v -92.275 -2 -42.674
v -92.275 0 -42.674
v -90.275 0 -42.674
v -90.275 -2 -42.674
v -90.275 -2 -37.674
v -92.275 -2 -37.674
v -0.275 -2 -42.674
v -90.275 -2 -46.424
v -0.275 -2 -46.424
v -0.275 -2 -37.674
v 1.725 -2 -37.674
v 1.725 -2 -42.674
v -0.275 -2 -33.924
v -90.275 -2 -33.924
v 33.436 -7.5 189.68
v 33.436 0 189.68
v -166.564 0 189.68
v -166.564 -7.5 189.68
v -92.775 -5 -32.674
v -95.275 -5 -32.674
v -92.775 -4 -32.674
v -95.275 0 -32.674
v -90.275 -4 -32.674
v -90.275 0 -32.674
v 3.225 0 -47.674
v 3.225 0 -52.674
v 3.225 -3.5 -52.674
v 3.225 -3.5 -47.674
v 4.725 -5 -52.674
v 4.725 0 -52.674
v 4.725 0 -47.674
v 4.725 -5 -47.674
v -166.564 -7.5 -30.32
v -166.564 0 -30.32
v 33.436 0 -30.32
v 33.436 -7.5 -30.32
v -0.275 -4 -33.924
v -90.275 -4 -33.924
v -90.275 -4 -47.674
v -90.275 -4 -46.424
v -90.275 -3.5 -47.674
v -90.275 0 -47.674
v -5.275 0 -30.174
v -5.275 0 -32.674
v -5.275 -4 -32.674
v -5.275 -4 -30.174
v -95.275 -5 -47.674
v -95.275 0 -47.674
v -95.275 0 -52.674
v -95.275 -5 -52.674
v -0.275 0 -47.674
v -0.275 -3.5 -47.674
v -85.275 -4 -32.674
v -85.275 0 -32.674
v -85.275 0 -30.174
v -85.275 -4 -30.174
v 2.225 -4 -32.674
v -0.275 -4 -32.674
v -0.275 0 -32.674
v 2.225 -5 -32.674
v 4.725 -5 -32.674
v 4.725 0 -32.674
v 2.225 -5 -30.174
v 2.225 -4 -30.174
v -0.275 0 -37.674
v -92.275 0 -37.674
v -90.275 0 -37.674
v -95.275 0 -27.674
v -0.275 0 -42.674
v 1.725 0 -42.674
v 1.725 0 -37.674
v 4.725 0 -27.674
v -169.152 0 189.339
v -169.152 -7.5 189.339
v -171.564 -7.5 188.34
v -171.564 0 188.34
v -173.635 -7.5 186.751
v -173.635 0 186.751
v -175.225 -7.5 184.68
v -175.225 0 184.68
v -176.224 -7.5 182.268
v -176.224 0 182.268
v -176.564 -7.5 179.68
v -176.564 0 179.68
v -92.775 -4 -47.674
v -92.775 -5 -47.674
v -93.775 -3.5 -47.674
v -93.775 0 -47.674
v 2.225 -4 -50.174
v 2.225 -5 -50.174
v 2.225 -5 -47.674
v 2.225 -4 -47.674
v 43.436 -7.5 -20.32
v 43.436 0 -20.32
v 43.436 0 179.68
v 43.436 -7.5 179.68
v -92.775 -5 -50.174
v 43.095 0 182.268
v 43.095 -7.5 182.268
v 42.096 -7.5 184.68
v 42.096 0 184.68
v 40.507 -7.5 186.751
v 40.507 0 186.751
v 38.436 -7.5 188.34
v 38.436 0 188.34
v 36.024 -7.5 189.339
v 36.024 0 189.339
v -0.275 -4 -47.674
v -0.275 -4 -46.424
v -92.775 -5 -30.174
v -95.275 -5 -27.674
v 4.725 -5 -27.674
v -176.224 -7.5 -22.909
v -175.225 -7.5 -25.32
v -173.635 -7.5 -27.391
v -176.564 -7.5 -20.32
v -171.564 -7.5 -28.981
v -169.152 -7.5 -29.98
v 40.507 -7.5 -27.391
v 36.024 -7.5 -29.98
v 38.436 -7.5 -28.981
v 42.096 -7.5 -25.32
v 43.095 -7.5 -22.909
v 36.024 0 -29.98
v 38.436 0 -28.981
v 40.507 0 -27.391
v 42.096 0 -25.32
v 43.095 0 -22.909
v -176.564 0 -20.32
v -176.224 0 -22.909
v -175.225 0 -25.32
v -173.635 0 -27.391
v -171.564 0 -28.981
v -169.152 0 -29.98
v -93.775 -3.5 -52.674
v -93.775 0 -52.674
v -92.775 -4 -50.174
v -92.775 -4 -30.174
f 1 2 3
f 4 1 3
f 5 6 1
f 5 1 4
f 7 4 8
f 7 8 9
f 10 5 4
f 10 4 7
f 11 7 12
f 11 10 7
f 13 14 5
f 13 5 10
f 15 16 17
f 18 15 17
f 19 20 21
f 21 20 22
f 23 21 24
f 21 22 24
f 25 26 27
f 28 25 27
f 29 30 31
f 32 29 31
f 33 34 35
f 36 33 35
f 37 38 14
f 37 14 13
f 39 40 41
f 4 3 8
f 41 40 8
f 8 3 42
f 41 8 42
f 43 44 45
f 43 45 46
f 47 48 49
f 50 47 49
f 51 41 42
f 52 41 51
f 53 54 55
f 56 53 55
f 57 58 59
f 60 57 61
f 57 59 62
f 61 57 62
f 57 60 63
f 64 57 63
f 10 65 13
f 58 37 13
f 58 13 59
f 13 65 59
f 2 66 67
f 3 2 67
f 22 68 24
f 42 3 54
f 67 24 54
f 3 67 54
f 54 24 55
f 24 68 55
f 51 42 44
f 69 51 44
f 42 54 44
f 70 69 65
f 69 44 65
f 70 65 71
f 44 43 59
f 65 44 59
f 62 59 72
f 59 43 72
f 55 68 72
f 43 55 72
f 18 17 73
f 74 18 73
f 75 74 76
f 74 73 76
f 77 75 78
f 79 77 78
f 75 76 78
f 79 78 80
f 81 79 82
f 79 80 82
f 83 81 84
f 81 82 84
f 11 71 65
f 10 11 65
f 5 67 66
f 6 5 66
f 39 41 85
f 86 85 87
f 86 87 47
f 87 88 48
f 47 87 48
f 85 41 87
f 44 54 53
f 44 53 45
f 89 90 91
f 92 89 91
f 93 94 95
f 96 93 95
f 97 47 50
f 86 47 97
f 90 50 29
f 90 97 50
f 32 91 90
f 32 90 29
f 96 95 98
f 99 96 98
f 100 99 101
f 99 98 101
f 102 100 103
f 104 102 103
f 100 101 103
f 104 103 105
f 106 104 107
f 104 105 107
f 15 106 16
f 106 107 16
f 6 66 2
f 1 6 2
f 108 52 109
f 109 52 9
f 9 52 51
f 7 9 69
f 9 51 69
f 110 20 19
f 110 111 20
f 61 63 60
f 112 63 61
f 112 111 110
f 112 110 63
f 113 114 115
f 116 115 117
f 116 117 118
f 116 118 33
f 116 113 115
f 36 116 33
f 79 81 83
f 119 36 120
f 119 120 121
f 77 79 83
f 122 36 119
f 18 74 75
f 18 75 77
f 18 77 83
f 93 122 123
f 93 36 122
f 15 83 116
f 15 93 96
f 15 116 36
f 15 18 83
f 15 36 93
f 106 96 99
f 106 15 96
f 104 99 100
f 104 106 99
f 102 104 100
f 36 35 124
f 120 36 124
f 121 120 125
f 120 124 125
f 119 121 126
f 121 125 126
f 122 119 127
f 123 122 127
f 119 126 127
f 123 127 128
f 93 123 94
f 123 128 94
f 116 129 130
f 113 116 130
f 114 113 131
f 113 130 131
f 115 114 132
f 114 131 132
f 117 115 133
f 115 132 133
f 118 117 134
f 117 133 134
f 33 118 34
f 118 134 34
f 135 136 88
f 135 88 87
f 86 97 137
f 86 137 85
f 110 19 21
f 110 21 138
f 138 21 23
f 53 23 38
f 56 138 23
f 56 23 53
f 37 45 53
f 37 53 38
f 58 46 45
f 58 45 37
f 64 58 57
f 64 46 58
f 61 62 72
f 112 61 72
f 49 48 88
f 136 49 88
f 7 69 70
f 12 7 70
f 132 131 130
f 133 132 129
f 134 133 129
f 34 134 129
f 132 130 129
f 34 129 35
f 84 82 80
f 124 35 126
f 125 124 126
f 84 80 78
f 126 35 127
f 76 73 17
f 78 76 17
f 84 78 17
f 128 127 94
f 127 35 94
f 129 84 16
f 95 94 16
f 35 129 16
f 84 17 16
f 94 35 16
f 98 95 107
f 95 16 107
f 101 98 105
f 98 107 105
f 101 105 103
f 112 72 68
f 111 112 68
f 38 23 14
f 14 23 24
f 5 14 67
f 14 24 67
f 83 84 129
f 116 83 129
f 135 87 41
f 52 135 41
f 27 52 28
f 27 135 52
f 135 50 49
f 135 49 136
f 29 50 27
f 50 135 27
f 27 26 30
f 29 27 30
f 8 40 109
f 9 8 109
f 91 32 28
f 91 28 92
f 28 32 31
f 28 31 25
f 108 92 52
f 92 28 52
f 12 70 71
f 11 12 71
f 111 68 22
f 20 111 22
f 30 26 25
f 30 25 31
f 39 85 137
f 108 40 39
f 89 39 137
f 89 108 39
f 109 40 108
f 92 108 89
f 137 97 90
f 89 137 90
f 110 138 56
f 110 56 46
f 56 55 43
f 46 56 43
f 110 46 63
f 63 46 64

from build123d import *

# Parameters (mm, degrees)
F0_R     = 5
F1_DEPTH = 7.5
F2_W     = 80
F2_H     = 2.5
F3_DEPTH = 5
F4_W     = 94
F4_H     = 12.5
F5_DEPTH = 3
F6_W     = 97
F6_H     = 3.5
F7_DEPTH = 5
F8_W     = 95
F8_H     = 20
F9_DEPTH = 1


with BuildPart() as f1:
    # F0 (on Front) → F1 (new body)
    with BuildSketch(Plane.XZ):
        with BuildLine():
            Line((33.4357412159, 189.6795940399), (-166.5642587841, 189.6795940399))
            ThreePointArc((-166.5642587841, 189.6795940399), (-173.6353265959, 186.7506618518), (-176.5642587841, 179.6795940399))
            Line((-176.5642587841, 179.6795940399), (-176.5642587841, -20.3204059601))
            ThreePointArc((-176.5642587841, -20.3204059601), (-173.6353265959, -27.3914737719), (-166.5642587841, -30.3204059601))
            Line((-166.5642587841, -30.3204059601), (33.4357412159, -30.3204059601))
            ThreePointArc((33.4357412159, -30.3204059601), (40.5068090278, -27.3914737719), (43.4357412159, -20.3204059601))
            Line((43.4357412159, -20.3204059601), (43.4357412159, 179.6795940399))
            ThreePointArc((43.4357412159, 179.6795940399), (40.5068090278, 186.7506618518), (33.4357412159, 189.6795940399))
        make_face()
        with Locations((-116.5642587841, 29.6795940399)):
            Circle(F0_R, mode=Mode.SUBTRACT)
        with Locations((-16.5642587841, 29.6795940399)):
            Circle(F0_R, mode=Mode.SUBTRACT)
        with Locations((-116.5642587841, 129.6795940399)):
            Circle(F0_R, mode=Mode.SUBTRACT)
        with Locations((-16.5642587841, 129.6795940399)):
            Circle(F0_R, mode=Mode.SUBTRACT)
        with Locations((-116.5642587841, 129.6795940399)):
            Circle(F0_R)
        with Locations((-16.5642587841, 129.6795940399)):
            Circle(F0_R)
        with Locations((-16.5642587841, 29.6795940399)):
            Circle(F0_R)
        with Locations((-116.5642587841, 29.6795940399)):
            Circle(F0_R)
    extrude(amount=F1_DEPTH)


with BuildPart() as f3:
    # F2 (on Front) → F3 (new body)
    with BuildSketch(Plane.XZ):
        Polygon((-95.2747841366, -52.6743675989), (-90.2747841366, -52.6743675989), (4.7252158634, -52.6743675989), (4.7252158634, -47.6743675989), (-0.2747841366, -47.6743675989), (-0.2747841366, -42.6743675989), (1.7252158634, -42.6743675989), (1.7252158634, -37.6743675989), (-0.2747841366, -37.6743675989), (-0.2747841366, -32.6743675989), (4.7252158634, -32.6743675989), (4.7252158634, -27.6743675989), (-90.2747841366, -27.6743675989), (-95.2747841366, -27.6743675989), (-95.2747841366, -32.6743675989), (-90.2747841366, -32.6743675989), (-90.2747841366, -37.6743675989), (-92.2747841366, -37.6743675989), (-92.2747841366, -42.6743675989), (-90.2747841366, -42.6743675989), (-90.2747841366, -47.6743675989), (-95.2747841366, -47.6743675989), align=None)
        with Locations((-45.2747841366, -31.4243675989)):
            Rectangle(F2_W, F2_H, mode=Mode.SUBTRACT)
    extrude(amount=F3_DEPTH)

    # F4 (on face) → F5 (cut)
    with BuildSketch(Plane.XZ.offset(5)):
        with Locations((-45.2747841366, -40.1743675989)):
            Rectangle(F4_W, F4_H)
    extrude(amount=-F5_DEPTH, mode=Mode.SUBTRACT)

    # F6 (on face) → F7 (cut)
    with BuildSketch(Plane(origin=(0, 0, -52.6743675989), x_dir=(1, 0, 0), z_dir=(0, 0, -1))):
        with Locations((-45.2747841366, 1.75)):
            Rectangle(F6_W, F6_H)
    extrude(amount=-F7_DEPTH, mode=Mode.SUBTRACT)

    # F8 (on face) → F9 (cut)
    with BuildSketch(Plane.XZ.offset(5)):
        with Locations((-45.2747841366, -40.1743675989)):
            Rectangle(F8_W, F8_H)
    extrude(amount=-F9_DEPTH, mode=Mode.SUBTRACT)


solid = Compound([f1.part, f3.part])
